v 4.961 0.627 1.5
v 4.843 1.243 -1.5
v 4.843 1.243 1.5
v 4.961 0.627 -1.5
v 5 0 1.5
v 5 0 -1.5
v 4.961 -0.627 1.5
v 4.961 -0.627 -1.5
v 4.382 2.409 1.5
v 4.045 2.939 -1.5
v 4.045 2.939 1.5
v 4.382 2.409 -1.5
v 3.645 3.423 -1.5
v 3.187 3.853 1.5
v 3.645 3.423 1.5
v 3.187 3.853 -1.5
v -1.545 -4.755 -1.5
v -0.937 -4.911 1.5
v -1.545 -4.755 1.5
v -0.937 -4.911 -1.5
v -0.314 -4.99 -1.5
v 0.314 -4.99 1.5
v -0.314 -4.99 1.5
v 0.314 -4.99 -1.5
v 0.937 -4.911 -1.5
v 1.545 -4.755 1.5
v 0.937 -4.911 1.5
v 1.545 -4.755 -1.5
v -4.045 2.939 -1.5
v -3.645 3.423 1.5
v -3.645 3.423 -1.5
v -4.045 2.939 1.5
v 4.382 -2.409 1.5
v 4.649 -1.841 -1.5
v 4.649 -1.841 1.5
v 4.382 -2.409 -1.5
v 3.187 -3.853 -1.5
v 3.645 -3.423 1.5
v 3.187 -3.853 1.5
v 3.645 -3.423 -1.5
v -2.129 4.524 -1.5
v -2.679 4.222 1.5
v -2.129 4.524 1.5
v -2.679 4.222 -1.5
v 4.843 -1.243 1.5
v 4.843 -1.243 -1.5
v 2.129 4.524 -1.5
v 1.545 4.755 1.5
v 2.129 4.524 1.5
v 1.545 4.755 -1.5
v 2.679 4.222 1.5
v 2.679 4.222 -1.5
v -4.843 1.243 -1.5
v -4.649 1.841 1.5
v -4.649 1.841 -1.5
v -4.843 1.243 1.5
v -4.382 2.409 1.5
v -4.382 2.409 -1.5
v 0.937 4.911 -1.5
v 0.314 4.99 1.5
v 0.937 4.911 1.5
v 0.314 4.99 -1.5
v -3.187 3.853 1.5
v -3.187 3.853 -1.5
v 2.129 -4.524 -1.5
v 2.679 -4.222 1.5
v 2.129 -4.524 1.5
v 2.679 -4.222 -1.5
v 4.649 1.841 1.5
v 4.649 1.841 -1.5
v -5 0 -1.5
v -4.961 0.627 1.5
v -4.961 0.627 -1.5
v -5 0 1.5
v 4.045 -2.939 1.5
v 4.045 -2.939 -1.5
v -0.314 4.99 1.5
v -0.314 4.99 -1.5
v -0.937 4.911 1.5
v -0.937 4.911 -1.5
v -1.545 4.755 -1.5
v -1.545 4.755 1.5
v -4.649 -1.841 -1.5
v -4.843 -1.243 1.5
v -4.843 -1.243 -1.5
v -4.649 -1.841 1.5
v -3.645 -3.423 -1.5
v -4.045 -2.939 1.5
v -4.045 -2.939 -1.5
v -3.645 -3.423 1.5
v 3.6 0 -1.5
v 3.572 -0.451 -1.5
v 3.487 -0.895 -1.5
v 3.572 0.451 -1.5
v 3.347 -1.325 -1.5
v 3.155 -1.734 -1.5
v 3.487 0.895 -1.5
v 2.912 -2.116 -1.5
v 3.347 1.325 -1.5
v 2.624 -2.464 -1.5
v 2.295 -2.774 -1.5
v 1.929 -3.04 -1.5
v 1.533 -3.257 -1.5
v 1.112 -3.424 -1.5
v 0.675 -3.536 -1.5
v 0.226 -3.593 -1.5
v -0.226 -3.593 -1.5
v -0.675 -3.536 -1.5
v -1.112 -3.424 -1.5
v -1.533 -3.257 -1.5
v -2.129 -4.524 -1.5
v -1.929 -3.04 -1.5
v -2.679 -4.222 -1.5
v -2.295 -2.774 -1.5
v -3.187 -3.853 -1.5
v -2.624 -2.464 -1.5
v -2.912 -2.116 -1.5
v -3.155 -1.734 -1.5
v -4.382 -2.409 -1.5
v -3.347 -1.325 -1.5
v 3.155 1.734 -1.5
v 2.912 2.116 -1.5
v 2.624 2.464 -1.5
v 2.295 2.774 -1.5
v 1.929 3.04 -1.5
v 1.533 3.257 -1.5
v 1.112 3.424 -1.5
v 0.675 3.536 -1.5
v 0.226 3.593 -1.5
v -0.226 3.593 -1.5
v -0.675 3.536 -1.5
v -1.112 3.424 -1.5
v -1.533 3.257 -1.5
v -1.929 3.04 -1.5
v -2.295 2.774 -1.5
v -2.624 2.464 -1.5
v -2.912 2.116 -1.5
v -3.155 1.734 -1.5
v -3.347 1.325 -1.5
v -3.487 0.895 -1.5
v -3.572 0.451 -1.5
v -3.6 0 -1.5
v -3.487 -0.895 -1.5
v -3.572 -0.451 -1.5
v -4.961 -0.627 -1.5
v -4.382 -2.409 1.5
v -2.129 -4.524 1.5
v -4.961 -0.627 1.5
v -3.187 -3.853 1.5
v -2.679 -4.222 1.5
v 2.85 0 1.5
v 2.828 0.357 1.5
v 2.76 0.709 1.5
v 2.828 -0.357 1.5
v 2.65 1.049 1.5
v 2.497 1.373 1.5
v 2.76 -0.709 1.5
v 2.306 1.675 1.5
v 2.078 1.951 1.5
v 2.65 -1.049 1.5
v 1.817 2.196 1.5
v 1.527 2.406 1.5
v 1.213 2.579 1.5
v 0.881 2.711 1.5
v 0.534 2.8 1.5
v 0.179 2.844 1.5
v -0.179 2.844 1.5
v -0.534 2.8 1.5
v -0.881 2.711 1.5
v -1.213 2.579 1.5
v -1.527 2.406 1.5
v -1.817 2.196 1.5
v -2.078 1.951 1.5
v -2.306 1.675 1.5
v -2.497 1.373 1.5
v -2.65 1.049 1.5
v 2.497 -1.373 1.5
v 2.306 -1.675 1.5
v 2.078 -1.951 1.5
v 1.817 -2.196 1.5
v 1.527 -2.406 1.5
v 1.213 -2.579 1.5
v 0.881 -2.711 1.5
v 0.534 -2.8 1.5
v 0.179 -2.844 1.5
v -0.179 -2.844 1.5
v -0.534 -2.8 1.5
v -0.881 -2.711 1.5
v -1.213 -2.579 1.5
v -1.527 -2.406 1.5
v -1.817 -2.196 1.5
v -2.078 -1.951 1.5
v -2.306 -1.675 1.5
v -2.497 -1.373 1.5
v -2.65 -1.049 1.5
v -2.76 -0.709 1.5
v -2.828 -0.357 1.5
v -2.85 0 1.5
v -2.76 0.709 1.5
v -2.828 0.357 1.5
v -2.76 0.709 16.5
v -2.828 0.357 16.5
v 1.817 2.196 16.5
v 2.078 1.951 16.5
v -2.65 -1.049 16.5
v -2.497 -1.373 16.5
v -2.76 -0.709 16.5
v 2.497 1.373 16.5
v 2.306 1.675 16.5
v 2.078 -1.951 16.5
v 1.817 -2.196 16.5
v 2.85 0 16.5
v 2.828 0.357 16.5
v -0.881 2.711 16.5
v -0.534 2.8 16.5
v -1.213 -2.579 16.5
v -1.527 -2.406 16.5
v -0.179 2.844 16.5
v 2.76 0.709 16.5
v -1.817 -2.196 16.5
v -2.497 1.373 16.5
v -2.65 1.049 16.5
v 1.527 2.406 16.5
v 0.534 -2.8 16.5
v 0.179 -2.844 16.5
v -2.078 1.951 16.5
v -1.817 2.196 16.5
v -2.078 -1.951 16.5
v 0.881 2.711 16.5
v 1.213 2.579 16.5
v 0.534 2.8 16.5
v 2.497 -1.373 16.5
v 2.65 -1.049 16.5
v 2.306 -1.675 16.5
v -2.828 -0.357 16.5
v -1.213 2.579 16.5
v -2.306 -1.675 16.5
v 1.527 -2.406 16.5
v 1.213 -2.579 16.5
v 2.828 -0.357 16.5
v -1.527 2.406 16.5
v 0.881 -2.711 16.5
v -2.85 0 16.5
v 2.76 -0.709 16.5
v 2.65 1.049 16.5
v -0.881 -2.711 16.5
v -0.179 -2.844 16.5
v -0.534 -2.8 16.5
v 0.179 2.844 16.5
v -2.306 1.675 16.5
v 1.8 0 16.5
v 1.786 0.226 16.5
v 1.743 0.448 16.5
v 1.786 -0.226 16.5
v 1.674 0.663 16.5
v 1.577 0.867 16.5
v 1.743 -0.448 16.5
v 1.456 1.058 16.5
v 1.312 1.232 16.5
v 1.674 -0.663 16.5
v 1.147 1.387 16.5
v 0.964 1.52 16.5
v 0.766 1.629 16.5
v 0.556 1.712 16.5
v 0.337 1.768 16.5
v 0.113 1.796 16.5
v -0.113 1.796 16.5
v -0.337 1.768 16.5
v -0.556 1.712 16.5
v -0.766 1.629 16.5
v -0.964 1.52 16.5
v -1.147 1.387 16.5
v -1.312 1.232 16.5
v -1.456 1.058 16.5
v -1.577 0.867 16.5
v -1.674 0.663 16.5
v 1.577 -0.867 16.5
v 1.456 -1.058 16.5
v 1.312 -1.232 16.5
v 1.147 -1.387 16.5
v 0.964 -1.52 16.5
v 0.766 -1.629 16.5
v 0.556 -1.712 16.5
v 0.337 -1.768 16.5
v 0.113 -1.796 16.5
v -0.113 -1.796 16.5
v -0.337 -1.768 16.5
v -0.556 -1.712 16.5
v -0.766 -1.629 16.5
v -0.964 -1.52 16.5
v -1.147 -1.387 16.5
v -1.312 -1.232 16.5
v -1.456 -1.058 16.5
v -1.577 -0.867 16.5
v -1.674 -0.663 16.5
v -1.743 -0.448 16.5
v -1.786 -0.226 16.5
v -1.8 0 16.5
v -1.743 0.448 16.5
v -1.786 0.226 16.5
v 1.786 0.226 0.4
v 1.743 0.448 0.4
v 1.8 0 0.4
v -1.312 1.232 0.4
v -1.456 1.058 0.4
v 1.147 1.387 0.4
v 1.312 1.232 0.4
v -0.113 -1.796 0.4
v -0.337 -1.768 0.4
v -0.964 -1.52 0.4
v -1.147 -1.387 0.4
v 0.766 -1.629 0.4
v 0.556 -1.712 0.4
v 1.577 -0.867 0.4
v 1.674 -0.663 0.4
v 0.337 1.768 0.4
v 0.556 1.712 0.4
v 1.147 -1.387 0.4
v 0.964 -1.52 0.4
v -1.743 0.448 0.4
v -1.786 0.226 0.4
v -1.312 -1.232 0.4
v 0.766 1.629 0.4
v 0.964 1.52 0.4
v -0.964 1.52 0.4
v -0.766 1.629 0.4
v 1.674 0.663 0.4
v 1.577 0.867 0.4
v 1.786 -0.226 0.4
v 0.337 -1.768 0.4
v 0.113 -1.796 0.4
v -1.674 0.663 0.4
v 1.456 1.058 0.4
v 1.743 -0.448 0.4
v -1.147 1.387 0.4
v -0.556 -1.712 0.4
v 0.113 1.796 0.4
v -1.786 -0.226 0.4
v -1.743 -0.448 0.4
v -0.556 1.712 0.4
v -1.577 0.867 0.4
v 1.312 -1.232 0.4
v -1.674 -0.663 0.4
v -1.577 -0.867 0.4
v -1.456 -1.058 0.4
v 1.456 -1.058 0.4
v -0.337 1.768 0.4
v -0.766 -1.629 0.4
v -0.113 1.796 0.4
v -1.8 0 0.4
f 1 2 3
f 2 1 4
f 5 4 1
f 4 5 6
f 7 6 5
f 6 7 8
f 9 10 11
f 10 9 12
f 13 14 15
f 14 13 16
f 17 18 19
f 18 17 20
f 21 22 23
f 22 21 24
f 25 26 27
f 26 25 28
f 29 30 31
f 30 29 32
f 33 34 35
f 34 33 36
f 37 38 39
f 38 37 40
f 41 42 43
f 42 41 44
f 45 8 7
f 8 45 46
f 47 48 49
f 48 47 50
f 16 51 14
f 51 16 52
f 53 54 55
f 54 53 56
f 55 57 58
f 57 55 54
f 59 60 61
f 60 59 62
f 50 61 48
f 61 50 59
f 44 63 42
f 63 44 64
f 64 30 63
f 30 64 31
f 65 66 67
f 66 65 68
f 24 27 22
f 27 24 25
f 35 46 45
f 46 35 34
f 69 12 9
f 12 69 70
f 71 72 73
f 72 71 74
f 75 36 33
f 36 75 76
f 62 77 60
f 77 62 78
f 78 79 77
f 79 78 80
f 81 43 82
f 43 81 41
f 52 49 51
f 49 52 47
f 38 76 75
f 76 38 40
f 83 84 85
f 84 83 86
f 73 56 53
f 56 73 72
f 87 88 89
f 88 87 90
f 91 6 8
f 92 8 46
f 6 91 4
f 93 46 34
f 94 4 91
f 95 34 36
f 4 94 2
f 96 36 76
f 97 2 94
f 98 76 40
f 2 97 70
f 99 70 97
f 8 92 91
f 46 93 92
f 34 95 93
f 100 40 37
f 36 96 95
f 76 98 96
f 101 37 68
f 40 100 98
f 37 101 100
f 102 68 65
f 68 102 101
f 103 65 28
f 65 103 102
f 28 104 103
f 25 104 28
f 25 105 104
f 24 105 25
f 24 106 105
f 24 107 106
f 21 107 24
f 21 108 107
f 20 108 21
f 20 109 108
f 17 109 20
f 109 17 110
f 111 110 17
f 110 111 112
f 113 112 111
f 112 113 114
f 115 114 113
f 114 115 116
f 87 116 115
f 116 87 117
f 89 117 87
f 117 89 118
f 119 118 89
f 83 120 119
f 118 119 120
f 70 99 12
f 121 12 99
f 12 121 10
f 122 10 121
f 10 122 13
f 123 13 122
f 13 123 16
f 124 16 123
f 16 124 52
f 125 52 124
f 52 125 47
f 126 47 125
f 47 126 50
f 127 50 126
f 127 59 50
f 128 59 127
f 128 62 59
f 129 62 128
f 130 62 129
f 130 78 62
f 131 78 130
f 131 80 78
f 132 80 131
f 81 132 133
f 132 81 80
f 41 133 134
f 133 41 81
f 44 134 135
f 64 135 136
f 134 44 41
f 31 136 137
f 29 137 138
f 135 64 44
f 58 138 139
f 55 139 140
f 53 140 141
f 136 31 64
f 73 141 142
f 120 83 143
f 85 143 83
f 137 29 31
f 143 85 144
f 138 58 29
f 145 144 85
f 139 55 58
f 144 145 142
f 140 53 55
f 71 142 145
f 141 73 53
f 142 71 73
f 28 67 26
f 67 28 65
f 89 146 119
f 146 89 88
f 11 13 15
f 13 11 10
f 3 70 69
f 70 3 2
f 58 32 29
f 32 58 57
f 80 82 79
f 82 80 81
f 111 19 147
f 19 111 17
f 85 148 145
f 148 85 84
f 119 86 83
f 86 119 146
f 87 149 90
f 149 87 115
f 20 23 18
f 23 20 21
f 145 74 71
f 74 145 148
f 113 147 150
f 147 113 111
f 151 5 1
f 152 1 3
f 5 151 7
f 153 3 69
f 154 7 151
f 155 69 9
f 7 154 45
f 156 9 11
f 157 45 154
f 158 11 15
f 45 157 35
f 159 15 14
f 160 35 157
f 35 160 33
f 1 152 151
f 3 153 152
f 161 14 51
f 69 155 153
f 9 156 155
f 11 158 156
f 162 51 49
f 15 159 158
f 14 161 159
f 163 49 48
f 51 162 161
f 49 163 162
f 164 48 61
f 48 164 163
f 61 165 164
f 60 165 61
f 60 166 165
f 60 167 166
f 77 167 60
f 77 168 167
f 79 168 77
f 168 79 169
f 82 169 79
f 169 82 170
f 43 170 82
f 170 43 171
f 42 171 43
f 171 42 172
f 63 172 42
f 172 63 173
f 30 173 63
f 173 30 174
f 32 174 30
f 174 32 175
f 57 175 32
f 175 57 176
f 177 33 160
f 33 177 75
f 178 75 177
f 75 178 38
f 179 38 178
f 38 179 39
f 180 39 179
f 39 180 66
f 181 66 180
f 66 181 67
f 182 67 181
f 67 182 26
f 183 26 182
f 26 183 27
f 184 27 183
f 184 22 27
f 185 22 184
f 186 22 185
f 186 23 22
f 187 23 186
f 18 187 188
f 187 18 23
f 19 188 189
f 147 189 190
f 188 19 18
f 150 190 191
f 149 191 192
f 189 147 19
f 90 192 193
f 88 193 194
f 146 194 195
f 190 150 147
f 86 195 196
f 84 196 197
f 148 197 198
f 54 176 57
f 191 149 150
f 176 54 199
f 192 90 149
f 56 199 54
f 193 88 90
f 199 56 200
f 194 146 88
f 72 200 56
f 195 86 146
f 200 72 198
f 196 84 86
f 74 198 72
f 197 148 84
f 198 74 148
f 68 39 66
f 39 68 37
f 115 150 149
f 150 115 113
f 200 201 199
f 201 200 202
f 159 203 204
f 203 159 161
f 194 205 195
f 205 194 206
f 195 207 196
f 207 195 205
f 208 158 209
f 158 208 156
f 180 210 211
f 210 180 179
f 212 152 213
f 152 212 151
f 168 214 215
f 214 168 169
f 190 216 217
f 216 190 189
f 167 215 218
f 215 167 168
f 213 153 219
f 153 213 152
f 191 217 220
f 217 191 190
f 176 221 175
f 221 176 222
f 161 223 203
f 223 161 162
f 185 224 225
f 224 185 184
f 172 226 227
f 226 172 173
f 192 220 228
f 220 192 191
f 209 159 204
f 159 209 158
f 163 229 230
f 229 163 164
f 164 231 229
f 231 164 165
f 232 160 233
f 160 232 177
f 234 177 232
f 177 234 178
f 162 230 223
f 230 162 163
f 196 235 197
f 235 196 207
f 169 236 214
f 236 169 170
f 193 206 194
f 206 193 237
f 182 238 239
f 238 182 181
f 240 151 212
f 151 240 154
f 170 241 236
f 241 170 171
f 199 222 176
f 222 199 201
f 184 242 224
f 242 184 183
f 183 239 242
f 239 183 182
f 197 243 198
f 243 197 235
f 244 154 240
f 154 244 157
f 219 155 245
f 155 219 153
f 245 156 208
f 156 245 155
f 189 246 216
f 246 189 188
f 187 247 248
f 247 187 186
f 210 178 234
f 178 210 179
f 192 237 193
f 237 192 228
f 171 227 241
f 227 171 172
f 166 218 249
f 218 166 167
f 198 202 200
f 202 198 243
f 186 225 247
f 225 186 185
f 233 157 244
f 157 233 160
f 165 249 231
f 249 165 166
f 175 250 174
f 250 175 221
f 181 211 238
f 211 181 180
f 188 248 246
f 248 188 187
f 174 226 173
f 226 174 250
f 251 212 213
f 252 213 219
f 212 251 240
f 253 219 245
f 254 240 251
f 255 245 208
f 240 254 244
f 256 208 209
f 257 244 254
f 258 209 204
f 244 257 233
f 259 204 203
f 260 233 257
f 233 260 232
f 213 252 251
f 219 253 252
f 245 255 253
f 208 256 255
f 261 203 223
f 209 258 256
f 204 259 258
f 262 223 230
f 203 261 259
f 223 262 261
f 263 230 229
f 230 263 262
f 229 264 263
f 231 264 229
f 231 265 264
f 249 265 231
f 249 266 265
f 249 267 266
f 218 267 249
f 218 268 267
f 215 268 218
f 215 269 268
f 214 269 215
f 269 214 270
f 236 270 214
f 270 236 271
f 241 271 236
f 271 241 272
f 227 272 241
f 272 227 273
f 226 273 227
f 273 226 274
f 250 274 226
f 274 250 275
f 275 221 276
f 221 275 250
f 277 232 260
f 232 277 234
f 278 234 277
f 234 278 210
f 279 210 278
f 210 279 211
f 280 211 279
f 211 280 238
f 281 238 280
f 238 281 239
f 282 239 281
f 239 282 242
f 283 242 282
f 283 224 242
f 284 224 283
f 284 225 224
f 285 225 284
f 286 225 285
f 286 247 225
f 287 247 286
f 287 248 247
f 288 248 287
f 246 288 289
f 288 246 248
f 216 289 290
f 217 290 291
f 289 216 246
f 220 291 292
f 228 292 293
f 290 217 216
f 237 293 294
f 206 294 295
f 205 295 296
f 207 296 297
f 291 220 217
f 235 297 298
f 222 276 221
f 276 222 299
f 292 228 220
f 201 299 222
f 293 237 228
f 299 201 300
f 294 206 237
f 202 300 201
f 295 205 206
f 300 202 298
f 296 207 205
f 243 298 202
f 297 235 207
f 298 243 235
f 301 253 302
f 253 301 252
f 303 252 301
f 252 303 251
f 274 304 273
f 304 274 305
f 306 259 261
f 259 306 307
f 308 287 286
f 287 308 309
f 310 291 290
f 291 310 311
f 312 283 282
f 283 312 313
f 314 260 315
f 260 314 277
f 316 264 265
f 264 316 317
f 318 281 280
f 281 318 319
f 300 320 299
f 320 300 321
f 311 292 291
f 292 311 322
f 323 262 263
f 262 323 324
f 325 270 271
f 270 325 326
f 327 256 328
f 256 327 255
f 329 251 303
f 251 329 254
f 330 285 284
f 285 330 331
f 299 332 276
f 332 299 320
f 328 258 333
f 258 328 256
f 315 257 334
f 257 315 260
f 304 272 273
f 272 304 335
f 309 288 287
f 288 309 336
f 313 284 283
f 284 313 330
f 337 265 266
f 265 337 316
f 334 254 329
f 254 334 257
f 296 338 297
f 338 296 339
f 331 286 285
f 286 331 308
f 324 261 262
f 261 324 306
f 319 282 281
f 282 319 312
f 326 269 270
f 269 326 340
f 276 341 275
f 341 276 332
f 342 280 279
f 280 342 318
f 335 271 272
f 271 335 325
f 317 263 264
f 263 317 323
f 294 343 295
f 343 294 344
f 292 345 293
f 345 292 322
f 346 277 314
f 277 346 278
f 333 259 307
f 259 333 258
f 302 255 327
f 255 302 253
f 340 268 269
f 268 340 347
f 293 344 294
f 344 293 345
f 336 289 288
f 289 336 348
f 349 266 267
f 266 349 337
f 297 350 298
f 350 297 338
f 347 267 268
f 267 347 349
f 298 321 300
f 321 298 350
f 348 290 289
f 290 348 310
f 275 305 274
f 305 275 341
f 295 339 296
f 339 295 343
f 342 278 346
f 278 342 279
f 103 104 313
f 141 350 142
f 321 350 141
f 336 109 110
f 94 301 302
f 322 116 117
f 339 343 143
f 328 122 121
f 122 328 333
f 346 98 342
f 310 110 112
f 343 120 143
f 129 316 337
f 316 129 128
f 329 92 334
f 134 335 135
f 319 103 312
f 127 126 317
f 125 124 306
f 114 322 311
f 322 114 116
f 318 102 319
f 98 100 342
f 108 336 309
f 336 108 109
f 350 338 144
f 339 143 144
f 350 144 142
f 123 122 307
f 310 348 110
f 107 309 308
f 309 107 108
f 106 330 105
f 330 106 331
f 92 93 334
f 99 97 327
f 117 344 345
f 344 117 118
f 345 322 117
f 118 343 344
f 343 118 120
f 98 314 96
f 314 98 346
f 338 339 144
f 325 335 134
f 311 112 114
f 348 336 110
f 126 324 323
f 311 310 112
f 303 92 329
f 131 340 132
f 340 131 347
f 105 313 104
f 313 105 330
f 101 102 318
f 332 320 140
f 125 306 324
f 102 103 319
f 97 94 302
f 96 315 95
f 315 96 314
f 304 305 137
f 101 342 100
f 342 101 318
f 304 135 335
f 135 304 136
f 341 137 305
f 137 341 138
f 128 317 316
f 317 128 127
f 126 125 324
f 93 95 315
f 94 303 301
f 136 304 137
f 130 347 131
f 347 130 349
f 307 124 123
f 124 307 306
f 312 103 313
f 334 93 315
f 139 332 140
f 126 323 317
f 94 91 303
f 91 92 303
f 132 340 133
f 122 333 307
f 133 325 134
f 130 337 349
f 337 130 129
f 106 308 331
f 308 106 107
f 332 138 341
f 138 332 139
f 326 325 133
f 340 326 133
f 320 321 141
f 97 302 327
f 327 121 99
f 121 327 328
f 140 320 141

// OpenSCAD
$fn = 50;


difference() {
	union() {
		translate(v = [0, 0, -1.5000000000]) {
			rotate(a = [0, 0, 0]) {
				cylinder(h = 3, r = 5.0000000000);
			}
		}
		translate(v = [0, 0, -1.5000000000]) {
			rotate(a = [0, 0, 0]) {
				cylinder(h = 18, r = 2.8500000000);
			}
		}
	}
	union() {
		translate(v = [0, 0, -125.0000000000]) {
			rotate(a = [0, 0, 0]) {
				cylinder(h = 250, r = 1.8000000000);
			}
		}
		#translate(v = [0, 0, 0.4000000000]) {
			rotate(a = [0, 180, 0]) {
				cylinder(h = 1.9000000000, r1 = 1.8000000000, r2 = 3.6000000000);
			}
		}
		#translate(v = [0, 0, 16.5000000000]) {
			rotate(a = [0, 180, 0]) {
				cylinder(h = 18, r = 1.8000000000);
			}
		}
	}
}
